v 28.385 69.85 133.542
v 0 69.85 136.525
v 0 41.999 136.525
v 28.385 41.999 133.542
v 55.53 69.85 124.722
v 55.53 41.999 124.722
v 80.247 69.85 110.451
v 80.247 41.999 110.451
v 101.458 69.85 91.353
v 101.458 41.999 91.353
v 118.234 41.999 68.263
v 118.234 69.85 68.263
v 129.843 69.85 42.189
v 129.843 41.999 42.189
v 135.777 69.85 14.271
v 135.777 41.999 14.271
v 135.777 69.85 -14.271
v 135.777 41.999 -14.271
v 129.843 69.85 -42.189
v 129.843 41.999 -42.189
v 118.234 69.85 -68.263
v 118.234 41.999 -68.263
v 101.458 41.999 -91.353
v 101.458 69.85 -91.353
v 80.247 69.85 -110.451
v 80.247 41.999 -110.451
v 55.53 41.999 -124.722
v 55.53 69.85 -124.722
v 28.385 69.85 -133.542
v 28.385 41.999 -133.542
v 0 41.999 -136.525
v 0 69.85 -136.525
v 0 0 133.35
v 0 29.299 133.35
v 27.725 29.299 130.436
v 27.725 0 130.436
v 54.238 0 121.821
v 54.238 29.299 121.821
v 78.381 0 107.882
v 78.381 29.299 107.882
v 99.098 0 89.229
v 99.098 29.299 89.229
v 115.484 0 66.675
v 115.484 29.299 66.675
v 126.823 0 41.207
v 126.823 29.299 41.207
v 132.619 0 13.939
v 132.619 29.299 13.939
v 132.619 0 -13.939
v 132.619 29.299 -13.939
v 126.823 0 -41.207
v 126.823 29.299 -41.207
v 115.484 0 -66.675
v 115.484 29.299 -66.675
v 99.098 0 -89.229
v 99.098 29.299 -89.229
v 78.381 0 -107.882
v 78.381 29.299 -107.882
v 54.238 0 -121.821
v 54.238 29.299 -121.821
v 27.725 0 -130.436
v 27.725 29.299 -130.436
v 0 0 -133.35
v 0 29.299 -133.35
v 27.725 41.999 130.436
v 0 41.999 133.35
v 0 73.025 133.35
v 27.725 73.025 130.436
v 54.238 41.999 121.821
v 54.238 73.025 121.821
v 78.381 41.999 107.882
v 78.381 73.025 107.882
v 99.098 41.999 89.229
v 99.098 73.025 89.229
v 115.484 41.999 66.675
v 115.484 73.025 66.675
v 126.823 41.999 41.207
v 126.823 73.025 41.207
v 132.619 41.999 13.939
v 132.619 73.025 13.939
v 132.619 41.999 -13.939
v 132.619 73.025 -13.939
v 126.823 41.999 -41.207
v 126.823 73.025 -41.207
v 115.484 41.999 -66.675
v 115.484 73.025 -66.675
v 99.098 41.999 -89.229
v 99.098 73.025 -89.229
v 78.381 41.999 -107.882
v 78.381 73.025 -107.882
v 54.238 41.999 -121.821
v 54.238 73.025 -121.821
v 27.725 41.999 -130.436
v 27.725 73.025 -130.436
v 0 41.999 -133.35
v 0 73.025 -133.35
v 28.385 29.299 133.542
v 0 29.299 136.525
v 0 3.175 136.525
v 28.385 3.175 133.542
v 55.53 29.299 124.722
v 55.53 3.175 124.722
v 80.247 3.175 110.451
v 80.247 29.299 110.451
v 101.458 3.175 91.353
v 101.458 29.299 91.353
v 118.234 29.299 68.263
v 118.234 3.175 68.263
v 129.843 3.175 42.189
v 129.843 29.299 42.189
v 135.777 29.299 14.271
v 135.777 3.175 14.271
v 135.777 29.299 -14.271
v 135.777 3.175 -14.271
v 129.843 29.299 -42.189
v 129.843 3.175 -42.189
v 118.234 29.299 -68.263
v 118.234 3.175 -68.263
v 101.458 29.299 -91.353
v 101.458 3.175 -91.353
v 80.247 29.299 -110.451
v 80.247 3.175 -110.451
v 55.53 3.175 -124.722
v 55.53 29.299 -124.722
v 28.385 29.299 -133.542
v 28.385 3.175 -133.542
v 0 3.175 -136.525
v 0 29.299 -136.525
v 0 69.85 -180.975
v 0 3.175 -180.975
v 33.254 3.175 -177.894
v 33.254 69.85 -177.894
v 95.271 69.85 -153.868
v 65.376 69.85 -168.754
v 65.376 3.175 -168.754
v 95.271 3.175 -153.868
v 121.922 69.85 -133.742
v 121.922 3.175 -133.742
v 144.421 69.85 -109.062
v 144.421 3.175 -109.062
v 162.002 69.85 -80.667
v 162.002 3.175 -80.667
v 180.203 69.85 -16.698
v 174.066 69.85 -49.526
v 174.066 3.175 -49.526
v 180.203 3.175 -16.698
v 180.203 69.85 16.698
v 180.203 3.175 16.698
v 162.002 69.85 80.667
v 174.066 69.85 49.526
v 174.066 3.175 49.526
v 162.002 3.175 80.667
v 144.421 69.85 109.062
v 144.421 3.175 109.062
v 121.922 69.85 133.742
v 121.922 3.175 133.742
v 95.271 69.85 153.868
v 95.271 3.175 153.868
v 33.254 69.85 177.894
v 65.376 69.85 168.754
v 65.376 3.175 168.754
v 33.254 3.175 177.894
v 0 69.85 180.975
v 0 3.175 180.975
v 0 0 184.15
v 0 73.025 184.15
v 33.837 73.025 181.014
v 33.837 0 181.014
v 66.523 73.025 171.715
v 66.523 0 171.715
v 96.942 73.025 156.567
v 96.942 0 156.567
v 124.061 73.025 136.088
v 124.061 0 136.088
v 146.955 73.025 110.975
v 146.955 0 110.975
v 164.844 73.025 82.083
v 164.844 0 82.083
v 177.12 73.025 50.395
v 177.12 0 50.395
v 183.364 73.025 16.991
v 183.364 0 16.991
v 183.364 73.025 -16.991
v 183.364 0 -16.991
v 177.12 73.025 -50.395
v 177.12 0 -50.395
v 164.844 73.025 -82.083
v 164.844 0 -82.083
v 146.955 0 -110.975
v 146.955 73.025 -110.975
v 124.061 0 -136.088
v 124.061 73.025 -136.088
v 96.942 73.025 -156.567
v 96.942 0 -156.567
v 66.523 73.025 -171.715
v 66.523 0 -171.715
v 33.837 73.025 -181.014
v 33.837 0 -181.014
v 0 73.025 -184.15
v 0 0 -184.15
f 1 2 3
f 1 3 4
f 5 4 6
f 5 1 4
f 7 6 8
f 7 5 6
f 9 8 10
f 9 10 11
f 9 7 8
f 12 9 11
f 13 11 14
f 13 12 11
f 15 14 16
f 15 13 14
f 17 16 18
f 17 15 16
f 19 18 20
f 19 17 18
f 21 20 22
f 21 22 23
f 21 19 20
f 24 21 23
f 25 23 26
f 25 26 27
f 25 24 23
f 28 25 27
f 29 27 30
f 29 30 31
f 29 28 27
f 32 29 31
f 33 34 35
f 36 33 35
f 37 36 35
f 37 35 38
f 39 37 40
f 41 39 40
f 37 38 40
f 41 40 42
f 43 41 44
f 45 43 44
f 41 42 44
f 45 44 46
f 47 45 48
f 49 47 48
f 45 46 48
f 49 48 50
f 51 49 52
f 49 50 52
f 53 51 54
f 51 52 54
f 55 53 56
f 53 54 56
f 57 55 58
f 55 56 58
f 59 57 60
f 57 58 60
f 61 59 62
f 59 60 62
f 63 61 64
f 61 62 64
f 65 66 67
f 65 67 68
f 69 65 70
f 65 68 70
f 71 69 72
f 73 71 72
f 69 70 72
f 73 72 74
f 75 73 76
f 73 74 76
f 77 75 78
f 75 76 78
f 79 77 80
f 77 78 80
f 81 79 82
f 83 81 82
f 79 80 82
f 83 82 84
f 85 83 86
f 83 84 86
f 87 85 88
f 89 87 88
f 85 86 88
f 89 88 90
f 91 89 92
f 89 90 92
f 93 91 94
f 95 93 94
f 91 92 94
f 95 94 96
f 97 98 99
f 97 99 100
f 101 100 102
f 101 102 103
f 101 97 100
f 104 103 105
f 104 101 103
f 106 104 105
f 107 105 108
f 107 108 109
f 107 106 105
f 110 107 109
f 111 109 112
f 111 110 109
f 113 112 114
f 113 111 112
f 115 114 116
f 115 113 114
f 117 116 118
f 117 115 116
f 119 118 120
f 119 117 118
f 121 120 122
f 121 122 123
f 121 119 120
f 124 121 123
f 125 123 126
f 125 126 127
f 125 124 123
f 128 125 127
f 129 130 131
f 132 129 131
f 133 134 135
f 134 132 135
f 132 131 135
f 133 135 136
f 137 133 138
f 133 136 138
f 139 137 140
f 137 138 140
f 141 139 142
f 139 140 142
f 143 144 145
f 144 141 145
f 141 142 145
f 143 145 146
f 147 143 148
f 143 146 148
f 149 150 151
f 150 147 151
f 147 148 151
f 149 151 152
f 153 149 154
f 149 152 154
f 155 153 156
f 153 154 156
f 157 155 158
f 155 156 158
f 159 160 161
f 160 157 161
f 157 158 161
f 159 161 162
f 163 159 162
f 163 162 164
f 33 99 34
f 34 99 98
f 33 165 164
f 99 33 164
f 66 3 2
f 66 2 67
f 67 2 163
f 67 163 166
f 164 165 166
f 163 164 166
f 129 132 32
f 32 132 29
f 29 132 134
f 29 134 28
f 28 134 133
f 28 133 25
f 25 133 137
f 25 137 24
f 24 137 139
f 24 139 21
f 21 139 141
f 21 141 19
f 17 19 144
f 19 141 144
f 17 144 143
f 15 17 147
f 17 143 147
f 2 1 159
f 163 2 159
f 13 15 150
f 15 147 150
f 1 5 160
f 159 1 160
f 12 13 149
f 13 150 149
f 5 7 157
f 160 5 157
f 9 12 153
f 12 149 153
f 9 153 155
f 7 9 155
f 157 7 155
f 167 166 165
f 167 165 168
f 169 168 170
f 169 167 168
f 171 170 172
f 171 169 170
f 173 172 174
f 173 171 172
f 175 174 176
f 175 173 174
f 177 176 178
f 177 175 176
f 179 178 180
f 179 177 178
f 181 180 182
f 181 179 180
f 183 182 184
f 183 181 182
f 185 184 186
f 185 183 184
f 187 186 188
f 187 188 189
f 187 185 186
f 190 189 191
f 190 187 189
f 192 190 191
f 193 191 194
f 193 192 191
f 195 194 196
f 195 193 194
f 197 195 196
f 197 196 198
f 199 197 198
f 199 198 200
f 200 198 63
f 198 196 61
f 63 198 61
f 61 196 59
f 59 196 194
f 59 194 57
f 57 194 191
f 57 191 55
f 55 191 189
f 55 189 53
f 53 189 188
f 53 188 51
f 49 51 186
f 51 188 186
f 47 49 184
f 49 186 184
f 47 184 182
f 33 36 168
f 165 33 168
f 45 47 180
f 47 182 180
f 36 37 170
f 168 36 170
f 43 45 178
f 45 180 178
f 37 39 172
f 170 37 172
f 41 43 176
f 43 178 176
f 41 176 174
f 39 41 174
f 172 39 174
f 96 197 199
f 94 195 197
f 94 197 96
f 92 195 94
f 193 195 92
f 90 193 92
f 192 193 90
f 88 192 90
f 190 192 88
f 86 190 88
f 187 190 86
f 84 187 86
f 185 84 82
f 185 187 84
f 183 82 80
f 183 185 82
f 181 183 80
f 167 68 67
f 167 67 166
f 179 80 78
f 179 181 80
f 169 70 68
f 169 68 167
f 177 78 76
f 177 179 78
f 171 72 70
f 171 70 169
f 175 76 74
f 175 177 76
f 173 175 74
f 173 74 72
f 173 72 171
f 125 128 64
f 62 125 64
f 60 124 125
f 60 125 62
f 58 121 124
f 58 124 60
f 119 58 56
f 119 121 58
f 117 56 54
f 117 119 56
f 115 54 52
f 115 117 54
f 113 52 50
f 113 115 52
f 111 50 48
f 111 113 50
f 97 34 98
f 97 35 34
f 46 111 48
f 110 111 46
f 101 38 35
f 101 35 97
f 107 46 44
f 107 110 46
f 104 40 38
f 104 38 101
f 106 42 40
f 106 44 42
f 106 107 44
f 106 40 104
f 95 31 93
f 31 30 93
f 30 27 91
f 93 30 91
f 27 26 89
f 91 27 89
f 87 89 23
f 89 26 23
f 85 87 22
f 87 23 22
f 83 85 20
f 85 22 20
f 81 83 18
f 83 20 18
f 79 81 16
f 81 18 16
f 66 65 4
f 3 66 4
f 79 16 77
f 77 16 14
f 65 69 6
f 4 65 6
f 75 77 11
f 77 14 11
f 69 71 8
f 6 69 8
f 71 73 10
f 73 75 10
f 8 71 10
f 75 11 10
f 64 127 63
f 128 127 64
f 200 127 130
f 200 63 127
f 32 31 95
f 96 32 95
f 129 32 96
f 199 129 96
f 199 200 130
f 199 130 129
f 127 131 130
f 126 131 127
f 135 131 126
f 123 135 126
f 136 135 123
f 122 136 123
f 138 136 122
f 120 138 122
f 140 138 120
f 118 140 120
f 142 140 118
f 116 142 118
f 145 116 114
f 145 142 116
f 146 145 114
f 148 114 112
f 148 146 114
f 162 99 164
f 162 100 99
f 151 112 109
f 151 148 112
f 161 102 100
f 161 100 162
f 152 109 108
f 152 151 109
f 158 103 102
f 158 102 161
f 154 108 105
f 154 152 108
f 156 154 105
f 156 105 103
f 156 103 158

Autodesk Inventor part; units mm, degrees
ref_plane "YZ Plane" through (0, 0, 0) normal (1, 0, 0) x (0, 1, 0)
ref_plane "XZ Plane" through (0, 0, 0) normal (0, 1, 0) x (-1, 0, 0)
ref_plane "XY Plane" through (0, 0, 0) normal (0, 0, 1) x (1, 0, 0)
sketch "Sketch1" plane through (0, 0, 0) normal (1, 0, 0) x (0, 1, 0)
  line L0 (0, 0) -> (50.8, 0)
  line L1 (0, 133.35) -> (0, 184.15)
  line L2 (0, 184.15) -> (73.025, 184.15)
  line L3 (73.025, 184.15) -> (73.025, 133.35)
  line L4 (69.85, 180.975) -> (3.175, 180.975)
  line L5 (3.175, 180.975) -> (3.175, 136.525)
  line L6 (69.85, 136.525) -> (69.85, 180.975)
  line L7 (29.2989, 148.3694) -> (29.2989, 120.4477)
  line L8 (41.9989, 148.9666) -> (41.9989, 122.6874)
  line L9 (0, 133.35) -> (29.2989, 133.35)
  line L10 (41.9989, 133.35) -> (73.025, 133.35)
  line L11 (3.175, 136.525) -> (29.2989, 136.525)
  line L12 (41.9989, 136.525) -> (69.85, 136.525)
  point P0 (3.175, 180.975)
  point P1 (69.85, 136.525)
  dimension "d0" = 50.8
  dimension "d3" = 50.8
  dimension "d4" = 73.025
  dimension "d5" = 3.175
  dimension "d6" = 3.175
  dimension "d7" = 3.175
  dimension "d8" = 3.175
  dimension "d9" = 3.175
  dimension "d11" = 3.175
  dimension "d13" = 26.1239
  dimension "d14" = 12.7
  dimension "d16" = 133.35
  dimension "d17" = 3.175
  dimension "d18" = 3.175
revolve "Revolution1" add sketch "Sketch1" angle 180 about axis through (0, 0, 0) along (0, 1, 0)
sketch "Sketch2" plane through (0, 73.025, 184.15) normal (0, 1, 0) x (1, 0, 0)
  point P0 (0, 184.15)
properties part number "Outer_Shell"
